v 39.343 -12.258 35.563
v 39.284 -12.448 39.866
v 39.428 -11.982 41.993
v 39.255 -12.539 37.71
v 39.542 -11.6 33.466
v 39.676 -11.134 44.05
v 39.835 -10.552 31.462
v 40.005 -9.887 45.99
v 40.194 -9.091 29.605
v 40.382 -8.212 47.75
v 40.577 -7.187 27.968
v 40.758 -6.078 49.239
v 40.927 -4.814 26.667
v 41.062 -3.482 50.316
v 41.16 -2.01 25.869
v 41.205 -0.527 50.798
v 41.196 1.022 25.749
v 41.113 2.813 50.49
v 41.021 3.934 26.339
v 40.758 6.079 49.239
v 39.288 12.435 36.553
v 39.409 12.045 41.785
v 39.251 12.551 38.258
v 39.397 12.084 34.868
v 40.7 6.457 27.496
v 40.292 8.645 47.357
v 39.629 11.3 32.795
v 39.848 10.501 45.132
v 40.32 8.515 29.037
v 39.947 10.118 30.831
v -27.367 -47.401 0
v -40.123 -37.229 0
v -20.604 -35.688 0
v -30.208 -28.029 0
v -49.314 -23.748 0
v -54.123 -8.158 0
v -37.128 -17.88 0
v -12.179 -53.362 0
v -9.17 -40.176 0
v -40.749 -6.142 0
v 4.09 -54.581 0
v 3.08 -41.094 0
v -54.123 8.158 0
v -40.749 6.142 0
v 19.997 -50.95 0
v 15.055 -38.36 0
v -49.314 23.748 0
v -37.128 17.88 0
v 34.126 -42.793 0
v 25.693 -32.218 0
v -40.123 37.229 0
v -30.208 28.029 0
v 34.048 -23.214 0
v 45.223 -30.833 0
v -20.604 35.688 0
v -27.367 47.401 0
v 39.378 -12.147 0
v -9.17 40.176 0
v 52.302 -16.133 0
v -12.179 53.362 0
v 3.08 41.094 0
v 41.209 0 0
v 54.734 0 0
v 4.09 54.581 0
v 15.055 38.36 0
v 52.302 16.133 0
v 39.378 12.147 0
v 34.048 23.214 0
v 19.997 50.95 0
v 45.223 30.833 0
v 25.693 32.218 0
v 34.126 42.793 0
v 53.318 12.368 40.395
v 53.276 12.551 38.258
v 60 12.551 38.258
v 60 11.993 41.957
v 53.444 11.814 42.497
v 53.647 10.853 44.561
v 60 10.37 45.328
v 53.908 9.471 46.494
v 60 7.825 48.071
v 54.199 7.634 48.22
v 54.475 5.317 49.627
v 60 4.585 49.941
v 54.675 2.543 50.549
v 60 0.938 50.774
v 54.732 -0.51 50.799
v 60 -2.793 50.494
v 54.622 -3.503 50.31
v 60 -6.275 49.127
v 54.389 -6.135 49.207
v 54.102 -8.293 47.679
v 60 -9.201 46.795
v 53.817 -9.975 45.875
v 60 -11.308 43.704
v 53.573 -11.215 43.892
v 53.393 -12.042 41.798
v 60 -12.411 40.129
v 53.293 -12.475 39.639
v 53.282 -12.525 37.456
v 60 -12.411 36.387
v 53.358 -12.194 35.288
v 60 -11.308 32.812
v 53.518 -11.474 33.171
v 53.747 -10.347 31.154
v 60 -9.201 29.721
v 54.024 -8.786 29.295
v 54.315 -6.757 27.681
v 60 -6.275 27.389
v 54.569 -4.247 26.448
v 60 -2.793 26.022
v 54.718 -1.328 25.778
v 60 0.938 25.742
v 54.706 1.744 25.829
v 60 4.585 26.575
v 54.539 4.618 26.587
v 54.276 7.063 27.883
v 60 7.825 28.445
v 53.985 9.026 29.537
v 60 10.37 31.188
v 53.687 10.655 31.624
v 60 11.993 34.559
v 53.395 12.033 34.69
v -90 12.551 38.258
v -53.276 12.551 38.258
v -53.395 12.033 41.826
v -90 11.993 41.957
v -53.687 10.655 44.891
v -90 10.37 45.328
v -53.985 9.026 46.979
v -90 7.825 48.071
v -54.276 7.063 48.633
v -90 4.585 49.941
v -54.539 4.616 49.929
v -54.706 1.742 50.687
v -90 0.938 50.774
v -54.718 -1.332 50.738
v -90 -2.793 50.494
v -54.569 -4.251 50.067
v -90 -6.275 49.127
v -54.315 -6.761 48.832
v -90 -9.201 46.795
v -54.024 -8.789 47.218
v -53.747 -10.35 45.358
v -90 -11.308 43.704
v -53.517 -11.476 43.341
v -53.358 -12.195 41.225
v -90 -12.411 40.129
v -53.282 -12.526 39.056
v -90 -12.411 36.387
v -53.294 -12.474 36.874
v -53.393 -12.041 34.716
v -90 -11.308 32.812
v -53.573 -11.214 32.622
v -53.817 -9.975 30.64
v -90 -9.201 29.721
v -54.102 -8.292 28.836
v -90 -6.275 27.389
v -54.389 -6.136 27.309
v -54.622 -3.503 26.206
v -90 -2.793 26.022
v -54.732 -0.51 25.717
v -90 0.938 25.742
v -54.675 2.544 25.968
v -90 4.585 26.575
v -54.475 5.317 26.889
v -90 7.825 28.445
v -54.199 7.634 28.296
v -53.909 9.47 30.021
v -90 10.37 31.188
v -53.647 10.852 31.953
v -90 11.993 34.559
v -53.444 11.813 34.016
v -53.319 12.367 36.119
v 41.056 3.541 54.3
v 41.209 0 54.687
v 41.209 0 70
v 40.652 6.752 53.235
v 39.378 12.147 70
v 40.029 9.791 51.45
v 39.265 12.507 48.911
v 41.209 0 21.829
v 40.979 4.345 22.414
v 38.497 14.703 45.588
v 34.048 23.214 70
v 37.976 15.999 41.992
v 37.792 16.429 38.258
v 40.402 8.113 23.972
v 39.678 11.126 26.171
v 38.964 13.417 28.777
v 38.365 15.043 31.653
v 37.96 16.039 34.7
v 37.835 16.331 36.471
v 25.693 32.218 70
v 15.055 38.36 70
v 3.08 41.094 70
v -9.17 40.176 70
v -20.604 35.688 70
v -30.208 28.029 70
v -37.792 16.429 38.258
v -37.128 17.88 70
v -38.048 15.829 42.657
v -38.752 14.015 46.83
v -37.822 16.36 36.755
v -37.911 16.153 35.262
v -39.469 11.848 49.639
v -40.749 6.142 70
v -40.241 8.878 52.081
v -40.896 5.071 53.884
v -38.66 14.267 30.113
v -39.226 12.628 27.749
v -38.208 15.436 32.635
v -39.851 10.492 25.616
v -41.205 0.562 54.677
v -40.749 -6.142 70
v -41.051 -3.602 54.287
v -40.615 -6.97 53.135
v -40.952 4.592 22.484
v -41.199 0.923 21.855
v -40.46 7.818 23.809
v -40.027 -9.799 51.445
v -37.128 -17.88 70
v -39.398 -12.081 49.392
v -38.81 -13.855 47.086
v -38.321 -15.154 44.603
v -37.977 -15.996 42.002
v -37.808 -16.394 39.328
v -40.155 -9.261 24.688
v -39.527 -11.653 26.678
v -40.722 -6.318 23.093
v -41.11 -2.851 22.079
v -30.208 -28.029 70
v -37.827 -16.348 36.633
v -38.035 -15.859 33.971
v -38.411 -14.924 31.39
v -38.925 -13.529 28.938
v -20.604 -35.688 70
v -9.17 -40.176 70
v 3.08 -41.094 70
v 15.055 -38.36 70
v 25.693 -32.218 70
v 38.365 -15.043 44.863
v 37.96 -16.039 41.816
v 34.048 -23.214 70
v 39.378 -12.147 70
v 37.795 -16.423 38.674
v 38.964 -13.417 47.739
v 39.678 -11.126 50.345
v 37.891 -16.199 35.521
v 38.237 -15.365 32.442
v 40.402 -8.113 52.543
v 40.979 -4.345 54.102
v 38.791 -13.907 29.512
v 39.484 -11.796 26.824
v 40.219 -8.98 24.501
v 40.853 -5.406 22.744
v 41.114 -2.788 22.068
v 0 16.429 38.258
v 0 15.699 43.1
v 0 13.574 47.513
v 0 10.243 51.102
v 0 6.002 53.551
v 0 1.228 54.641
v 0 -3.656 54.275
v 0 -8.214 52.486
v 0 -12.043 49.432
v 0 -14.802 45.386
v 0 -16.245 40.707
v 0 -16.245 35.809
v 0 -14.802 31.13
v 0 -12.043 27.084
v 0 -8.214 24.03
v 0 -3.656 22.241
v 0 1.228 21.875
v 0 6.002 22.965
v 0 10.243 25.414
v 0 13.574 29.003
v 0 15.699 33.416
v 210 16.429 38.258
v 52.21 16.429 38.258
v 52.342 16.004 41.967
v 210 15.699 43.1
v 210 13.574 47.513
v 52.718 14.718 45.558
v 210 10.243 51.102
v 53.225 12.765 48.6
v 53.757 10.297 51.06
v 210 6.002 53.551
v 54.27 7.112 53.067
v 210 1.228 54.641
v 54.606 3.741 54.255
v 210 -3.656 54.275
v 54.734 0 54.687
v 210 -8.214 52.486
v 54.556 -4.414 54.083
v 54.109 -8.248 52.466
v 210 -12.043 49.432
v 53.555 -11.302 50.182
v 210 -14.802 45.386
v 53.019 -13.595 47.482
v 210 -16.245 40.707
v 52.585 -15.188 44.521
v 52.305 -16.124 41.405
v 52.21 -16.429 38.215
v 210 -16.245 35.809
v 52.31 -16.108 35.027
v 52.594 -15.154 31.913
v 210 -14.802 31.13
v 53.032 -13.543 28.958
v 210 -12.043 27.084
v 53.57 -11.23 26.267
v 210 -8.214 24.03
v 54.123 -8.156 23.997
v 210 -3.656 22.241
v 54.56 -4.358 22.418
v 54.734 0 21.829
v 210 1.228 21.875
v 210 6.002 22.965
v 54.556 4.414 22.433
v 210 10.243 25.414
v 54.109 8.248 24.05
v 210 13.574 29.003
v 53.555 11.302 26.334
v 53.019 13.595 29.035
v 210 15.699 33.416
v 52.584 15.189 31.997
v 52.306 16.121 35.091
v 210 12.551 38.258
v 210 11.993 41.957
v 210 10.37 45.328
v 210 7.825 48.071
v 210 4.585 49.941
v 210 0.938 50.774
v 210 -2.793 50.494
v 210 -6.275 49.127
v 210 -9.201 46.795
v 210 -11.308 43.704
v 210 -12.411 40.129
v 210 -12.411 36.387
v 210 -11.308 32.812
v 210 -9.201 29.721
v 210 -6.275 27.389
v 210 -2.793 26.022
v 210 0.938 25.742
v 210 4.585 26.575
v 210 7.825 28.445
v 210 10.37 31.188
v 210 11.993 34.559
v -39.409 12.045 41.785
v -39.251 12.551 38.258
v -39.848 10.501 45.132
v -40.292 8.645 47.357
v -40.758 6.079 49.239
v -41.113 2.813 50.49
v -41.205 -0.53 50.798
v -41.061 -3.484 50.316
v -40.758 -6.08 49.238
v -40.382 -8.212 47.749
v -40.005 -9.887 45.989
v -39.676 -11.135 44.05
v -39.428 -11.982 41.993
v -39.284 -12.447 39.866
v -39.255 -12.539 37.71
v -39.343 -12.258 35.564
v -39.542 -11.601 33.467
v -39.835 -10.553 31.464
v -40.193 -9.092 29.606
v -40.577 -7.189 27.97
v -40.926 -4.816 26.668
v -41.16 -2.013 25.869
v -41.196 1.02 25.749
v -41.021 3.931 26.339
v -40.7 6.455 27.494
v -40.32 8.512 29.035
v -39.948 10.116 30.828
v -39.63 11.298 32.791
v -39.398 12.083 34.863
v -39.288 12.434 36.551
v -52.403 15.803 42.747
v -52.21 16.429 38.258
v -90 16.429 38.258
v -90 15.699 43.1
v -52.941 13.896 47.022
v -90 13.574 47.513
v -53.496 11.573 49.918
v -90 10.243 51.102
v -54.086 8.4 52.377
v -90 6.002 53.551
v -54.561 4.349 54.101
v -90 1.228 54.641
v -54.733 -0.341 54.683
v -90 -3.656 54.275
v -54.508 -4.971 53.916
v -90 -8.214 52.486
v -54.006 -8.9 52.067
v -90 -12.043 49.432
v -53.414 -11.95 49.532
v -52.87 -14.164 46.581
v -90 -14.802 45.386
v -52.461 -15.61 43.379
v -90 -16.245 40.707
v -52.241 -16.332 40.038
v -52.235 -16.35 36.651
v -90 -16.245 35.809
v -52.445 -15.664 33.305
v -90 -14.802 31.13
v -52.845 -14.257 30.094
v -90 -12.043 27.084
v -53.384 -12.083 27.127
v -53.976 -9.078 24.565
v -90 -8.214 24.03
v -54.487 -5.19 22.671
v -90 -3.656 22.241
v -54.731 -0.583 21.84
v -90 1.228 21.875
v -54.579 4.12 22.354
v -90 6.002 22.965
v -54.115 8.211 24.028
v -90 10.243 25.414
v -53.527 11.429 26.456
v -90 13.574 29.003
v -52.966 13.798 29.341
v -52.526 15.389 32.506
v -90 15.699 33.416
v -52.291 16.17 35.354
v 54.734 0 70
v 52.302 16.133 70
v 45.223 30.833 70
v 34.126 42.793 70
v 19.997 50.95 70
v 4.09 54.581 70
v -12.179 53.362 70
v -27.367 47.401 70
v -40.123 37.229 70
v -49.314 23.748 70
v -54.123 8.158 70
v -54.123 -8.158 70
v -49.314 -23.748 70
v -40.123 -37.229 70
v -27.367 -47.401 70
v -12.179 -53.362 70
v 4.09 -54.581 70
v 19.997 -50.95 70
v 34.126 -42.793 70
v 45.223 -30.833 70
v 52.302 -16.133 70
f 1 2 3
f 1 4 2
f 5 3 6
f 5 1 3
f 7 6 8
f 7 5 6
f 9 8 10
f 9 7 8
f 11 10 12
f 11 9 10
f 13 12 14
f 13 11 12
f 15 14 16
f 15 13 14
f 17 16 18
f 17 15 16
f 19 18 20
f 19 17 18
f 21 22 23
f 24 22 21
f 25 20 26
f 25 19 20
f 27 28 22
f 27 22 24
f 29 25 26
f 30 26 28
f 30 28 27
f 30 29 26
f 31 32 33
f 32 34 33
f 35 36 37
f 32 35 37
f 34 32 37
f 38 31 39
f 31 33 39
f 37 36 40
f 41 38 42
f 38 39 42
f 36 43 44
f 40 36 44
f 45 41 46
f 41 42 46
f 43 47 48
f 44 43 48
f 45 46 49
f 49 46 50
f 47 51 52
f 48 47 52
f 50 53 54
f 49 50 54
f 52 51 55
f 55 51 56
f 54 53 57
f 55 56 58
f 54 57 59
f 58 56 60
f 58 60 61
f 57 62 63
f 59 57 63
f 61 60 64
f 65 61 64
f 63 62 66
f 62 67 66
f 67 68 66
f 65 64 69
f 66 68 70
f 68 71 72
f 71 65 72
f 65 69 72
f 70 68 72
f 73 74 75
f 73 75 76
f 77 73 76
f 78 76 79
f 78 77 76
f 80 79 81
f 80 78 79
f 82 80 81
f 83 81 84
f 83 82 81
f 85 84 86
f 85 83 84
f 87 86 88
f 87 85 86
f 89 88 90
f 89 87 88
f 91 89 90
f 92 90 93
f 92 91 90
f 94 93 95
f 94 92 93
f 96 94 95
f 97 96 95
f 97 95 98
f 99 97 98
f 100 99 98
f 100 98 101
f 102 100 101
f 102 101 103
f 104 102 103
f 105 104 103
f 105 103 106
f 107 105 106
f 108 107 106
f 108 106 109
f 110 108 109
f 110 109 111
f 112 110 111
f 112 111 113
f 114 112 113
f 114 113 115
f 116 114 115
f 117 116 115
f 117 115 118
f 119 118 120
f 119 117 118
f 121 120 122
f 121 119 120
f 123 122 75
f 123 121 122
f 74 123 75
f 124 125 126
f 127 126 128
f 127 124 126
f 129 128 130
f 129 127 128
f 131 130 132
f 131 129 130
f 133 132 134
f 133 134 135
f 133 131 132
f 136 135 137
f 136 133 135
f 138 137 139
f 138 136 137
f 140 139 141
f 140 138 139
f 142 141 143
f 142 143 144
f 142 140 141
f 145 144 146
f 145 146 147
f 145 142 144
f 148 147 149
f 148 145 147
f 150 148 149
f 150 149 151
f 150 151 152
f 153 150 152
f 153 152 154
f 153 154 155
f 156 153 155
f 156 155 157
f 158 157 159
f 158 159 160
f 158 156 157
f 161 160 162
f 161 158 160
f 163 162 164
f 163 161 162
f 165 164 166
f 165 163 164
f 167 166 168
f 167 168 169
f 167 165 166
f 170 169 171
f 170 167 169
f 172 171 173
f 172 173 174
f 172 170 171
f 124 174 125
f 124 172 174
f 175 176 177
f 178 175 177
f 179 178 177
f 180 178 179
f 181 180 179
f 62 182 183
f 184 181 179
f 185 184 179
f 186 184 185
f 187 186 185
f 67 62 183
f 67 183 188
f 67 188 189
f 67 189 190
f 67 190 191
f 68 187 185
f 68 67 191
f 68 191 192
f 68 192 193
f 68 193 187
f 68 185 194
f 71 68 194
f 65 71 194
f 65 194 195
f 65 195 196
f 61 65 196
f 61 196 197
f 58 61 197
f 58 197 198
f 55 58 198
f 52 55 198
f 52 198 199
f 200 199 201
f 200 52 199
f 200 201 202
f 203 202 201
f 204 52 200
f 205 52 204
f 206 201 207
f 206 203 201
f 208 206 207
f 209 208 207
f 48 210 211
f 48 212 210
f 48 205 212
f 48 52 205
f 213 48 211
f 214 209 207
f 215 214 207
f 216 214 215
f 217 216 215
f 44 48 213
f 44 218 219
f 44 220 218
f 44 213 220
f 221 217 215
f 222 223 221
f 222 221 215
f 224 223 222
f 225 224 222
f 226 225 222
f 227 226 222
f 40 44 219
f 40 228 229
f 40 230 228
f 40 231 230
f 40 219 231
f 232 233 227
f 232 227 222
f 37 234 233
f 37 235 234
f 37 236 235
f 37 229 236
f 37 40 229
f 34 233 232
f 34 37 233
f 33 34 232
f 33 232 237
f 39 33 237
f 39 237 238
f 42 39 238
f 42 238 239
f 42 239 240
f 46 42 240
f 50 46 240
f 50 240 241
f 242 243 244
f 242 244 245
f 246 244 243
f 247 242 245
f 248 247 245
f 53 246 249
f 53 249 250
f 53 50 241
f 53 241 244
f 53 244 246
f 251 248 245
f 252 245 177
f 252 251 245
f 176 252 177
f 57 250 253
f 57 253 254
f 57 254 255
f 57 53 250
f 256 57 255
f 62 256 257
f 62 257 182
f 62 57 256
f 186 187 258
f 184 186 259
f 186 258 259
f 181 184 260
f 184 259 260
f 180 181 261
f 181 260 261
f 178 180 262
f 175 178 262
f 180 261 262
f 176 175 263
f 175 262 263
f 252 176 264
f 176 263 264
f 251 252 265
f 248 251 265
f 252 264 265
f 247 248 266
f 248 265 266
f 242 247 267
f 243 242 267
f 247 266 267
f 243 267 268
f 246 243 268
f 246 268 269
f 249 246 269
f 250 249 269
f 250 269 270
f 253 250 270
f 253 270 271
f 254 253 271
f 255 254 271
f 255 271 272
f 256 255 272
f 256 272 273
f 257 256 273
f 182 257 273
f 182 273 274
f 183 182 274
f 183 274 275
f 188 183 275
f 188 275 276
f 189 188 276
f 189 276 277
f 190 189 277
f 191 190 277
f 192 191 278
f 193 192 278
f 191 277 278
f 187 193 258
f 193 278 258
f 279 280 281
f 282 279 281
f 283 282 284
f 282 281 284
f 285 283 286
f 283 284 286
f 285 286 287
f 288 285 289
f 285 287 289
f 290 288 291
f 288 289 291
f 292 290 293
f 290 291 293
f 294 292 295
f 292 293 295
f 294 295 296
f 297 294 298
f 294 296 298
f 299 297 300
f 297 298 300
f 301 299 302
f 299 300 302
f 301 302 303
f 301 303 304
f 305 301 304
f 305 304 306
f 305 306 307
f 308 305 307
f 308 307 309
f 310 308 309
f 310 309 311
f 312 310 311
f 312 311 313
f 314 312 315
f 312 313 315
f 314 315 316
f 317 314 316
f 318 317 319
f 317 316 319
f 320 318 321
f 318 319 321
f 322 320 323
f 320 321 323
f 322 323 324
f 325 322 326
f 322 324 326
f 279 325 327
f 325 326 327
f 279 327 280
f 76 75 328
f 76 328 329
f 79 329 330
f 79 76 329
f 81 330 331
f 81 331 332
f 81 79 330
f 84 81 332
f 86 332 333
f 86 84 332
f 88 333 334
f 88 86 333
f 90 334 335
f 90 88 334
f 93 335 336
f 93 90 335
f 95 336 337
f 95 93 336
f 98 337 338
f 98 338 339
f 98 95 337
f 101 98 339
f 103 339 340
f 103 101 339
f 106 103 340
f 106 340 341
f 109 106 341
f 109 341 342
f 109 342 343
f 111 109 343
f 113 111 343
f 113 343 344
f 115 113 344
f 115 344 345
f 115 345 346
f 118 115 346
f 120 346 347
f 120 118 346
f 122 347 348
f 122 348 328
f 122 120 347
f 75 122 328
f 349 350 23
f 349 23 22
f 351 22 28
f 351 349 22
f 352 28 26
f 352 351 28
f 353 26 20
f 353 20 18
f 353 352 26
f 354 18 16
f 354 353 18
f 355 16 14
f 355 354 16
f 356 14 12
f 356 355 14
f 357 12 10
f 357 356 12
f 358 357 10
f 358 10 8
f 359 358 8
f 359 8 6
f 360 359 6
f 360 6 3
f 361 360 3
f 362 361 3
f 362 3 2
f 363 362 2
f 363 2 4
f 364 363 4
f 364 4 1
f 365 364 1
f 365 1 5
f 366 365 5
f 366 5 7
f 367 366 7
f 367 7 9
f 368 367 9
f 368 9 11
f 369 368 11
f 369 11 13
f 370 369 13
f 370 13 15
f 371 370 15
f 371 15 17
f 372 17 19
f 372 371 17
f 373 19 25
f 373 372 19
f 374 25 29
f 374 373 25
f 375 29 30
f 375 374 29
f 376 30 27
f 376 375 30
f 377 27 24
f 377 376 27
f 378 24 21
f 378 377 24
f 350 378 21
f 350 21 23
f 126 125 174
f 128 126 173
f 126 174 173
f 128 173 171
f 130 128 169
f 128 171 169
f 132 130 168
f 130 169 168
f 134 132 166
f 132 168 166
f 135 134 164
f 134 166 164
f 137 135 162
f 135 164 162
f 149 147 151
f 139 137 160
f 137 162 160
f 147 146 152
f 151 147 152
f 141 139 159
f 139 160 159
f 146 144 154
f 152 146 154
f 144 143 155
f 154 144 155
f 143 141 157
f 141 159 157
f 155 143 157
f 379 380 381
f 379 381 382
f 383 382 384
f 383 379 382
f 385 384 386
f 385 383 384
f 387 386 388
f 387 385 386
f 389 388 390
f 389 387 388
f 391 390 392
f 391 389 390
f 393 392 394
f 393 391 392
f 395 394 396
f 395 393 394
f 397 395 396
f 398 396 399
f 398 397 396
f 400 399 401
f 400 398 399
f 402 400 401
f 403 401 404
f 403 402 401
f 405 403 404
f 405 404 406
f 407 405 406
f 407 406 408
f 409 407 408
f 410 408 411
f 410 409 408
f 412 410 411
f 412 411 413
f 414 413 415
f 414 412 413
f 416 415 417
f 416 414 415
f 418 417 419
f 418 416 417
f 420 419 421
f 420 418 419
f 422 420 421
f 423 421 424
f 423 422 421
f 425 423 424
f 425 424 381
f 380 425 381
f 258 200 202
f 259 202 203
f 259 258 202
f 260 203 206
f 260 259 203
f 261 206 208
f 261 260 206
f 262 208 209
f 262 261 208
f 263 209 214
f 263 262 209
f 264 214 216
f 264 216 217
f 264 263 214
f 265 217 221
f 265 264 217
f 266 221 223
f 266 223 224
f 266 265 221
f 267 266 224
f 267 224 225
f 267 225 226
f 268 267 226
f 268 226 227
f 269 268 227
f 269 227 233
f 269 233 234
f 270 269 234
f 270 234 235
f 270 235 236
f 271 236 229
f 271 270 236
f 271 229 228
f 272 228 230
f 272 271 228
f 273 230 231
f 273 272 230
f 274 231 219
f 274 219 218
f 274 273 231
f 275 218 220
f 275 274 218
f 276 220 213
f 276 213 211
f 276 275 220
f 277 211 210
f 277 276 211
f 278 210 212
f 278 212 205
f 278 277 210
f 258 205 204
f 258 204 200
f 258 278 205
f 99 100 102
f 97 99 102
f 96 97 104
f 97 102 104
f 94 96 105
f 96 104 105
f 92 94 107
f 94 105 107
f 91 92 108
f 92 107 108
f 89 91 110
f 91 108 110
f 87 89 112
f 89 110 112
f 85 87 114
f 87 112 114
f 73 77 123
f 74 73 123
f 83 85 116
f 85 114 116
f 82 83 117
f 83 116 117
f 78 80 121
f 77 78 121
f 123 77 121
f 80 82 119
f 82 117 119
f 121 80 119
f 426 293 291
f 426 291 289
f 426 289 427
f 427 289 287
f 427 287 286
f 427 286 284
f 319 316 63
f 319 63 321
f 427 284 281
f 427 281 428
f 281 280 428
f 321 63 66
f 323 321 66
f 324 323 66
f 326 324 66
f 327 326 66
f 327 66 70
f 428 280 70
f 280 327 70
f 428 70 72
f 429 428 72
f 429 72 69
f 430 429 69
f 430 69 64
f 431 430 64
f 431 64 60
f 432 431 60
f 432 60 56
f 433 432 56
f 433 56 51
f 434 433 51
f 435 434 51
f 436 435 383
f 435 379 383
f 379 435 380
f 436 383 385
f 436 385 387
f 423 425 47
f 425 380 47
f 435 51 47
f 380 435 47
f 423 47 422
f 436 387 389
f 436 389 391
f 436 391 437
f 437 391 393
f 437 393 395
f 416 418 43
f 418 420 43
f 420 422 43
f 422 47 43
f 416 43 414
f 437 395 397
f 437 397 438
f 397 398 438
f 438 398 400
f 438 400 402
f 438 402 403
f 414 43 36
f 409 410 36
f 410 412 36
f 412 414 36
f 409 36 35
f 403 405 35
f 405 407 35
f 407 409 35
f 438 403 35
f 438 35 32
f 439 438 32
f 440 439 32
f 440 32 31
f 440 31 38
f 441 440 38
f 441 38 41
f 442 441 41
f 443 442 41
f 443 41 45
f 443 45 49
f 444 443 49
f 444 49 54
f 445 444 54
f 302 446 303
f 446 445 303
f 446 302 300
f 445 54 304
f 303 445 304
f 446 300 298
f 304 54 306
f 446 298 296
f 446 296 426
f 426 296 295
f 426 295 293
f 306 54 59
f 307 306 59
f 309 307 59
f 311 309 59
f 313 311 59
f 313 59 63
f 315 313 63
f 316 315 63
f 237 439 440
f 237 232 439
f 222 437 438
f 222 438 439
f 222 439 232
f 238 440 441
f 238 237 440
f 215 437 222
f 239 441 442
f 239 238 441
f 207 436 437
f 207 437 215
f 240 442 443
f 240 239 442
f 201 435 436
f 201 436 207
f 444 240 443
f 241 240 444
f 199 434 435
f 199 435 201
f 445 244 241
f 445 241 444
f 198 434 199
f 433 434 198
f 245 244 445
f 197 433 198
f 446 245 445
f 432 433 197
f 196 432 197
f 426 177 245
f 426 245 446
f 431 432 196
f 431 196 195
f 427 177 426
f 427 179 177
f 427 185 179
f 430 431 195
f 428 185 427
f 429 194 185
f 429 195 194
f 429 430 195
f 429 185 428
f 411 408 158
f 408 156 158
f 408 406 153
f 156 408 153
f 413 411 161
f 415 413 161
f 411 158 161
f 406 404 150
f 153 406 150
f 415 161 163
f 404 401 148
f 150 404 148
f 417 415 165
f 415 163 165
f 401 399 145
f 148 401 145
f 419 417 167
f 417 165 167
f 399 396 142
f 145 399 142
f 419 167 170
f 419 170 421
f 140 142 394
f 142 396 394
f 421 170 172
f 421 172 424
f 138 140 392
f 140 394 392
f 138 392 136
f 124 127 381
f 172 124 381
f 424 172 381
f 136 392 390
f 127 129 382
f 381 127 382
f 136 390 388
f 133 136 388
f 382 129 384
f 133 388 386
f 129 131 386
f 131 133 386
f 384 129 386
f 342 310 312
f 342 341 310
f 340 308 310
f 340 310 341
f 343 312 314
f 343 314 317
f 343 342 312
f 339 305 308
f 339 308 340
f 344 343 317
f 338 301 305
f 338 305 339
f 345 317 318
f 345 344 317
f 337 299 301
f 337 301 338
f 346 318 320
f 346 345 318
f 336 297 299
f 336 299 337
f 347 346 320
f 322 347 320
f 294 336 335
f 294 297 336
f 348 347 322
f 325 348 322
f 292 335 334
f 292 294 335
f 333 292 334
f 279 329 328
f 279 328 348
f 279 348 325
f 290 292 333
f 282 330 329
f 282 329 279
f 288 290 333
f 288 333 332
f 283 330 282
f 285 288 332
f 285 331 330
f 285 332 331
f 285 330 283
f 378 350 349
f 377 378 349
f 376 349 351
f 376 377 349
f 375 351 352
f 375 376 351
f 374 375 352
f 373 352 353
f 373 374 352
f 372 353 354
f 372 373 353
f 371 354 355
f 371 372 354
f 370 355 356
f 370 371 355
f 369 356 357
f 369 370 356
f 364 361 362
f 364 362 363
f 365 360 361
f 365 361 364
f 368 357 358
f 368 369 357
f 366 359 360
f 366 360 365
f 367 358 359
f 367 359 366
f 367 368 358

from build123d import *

# Parameters (mm, degrees)
F0_R        = 54.734044
F0_R_2      = 41.208853
F1_DEPTH    = 70
F2_R        = 16.428668
F2_R_2      = 12.550966
F3_DEPTH    = 60
F3_FACE_R   = 16.428668
F3_FACE_R_2 = 12.550966
F4_DEPTH    = 150


with BuildPart() as f1:
    # F0 (on Top) → F1 (new body)
    with BuildSketch(Plane.XY):
        Circle(F0_R)
        Circle(F0_R_2, mode=Mode.SUBTRACT)
    extrude(amount=F1_DEPTH)

    # F2 (on Right) → F3 (join)
    with BuildSketch(Plane.YZ):
        with Locations((0, 38.257983)):
            Circle(F2_R)
        with Locations((0, 38.257983)):
            Circle(F2_R_2, mode=Mode.SUBTRACT)
    extrude(amount=F3_DEPTH)

    # F3_face (on face) → F4 (join, symmetric)
    with BuildSketch(Plane(origin=(60, 0, 38.257983), x_dir=(0, 1, 0), z_dir=(1, 0, 0))):
        Circle(F3_FACE_R)
        Circle(F3_FACE_R_2, mode=Mode.SUBTRACT)
    extrude(amount=F4_DEPTH, both=True)


solid = f1.part
